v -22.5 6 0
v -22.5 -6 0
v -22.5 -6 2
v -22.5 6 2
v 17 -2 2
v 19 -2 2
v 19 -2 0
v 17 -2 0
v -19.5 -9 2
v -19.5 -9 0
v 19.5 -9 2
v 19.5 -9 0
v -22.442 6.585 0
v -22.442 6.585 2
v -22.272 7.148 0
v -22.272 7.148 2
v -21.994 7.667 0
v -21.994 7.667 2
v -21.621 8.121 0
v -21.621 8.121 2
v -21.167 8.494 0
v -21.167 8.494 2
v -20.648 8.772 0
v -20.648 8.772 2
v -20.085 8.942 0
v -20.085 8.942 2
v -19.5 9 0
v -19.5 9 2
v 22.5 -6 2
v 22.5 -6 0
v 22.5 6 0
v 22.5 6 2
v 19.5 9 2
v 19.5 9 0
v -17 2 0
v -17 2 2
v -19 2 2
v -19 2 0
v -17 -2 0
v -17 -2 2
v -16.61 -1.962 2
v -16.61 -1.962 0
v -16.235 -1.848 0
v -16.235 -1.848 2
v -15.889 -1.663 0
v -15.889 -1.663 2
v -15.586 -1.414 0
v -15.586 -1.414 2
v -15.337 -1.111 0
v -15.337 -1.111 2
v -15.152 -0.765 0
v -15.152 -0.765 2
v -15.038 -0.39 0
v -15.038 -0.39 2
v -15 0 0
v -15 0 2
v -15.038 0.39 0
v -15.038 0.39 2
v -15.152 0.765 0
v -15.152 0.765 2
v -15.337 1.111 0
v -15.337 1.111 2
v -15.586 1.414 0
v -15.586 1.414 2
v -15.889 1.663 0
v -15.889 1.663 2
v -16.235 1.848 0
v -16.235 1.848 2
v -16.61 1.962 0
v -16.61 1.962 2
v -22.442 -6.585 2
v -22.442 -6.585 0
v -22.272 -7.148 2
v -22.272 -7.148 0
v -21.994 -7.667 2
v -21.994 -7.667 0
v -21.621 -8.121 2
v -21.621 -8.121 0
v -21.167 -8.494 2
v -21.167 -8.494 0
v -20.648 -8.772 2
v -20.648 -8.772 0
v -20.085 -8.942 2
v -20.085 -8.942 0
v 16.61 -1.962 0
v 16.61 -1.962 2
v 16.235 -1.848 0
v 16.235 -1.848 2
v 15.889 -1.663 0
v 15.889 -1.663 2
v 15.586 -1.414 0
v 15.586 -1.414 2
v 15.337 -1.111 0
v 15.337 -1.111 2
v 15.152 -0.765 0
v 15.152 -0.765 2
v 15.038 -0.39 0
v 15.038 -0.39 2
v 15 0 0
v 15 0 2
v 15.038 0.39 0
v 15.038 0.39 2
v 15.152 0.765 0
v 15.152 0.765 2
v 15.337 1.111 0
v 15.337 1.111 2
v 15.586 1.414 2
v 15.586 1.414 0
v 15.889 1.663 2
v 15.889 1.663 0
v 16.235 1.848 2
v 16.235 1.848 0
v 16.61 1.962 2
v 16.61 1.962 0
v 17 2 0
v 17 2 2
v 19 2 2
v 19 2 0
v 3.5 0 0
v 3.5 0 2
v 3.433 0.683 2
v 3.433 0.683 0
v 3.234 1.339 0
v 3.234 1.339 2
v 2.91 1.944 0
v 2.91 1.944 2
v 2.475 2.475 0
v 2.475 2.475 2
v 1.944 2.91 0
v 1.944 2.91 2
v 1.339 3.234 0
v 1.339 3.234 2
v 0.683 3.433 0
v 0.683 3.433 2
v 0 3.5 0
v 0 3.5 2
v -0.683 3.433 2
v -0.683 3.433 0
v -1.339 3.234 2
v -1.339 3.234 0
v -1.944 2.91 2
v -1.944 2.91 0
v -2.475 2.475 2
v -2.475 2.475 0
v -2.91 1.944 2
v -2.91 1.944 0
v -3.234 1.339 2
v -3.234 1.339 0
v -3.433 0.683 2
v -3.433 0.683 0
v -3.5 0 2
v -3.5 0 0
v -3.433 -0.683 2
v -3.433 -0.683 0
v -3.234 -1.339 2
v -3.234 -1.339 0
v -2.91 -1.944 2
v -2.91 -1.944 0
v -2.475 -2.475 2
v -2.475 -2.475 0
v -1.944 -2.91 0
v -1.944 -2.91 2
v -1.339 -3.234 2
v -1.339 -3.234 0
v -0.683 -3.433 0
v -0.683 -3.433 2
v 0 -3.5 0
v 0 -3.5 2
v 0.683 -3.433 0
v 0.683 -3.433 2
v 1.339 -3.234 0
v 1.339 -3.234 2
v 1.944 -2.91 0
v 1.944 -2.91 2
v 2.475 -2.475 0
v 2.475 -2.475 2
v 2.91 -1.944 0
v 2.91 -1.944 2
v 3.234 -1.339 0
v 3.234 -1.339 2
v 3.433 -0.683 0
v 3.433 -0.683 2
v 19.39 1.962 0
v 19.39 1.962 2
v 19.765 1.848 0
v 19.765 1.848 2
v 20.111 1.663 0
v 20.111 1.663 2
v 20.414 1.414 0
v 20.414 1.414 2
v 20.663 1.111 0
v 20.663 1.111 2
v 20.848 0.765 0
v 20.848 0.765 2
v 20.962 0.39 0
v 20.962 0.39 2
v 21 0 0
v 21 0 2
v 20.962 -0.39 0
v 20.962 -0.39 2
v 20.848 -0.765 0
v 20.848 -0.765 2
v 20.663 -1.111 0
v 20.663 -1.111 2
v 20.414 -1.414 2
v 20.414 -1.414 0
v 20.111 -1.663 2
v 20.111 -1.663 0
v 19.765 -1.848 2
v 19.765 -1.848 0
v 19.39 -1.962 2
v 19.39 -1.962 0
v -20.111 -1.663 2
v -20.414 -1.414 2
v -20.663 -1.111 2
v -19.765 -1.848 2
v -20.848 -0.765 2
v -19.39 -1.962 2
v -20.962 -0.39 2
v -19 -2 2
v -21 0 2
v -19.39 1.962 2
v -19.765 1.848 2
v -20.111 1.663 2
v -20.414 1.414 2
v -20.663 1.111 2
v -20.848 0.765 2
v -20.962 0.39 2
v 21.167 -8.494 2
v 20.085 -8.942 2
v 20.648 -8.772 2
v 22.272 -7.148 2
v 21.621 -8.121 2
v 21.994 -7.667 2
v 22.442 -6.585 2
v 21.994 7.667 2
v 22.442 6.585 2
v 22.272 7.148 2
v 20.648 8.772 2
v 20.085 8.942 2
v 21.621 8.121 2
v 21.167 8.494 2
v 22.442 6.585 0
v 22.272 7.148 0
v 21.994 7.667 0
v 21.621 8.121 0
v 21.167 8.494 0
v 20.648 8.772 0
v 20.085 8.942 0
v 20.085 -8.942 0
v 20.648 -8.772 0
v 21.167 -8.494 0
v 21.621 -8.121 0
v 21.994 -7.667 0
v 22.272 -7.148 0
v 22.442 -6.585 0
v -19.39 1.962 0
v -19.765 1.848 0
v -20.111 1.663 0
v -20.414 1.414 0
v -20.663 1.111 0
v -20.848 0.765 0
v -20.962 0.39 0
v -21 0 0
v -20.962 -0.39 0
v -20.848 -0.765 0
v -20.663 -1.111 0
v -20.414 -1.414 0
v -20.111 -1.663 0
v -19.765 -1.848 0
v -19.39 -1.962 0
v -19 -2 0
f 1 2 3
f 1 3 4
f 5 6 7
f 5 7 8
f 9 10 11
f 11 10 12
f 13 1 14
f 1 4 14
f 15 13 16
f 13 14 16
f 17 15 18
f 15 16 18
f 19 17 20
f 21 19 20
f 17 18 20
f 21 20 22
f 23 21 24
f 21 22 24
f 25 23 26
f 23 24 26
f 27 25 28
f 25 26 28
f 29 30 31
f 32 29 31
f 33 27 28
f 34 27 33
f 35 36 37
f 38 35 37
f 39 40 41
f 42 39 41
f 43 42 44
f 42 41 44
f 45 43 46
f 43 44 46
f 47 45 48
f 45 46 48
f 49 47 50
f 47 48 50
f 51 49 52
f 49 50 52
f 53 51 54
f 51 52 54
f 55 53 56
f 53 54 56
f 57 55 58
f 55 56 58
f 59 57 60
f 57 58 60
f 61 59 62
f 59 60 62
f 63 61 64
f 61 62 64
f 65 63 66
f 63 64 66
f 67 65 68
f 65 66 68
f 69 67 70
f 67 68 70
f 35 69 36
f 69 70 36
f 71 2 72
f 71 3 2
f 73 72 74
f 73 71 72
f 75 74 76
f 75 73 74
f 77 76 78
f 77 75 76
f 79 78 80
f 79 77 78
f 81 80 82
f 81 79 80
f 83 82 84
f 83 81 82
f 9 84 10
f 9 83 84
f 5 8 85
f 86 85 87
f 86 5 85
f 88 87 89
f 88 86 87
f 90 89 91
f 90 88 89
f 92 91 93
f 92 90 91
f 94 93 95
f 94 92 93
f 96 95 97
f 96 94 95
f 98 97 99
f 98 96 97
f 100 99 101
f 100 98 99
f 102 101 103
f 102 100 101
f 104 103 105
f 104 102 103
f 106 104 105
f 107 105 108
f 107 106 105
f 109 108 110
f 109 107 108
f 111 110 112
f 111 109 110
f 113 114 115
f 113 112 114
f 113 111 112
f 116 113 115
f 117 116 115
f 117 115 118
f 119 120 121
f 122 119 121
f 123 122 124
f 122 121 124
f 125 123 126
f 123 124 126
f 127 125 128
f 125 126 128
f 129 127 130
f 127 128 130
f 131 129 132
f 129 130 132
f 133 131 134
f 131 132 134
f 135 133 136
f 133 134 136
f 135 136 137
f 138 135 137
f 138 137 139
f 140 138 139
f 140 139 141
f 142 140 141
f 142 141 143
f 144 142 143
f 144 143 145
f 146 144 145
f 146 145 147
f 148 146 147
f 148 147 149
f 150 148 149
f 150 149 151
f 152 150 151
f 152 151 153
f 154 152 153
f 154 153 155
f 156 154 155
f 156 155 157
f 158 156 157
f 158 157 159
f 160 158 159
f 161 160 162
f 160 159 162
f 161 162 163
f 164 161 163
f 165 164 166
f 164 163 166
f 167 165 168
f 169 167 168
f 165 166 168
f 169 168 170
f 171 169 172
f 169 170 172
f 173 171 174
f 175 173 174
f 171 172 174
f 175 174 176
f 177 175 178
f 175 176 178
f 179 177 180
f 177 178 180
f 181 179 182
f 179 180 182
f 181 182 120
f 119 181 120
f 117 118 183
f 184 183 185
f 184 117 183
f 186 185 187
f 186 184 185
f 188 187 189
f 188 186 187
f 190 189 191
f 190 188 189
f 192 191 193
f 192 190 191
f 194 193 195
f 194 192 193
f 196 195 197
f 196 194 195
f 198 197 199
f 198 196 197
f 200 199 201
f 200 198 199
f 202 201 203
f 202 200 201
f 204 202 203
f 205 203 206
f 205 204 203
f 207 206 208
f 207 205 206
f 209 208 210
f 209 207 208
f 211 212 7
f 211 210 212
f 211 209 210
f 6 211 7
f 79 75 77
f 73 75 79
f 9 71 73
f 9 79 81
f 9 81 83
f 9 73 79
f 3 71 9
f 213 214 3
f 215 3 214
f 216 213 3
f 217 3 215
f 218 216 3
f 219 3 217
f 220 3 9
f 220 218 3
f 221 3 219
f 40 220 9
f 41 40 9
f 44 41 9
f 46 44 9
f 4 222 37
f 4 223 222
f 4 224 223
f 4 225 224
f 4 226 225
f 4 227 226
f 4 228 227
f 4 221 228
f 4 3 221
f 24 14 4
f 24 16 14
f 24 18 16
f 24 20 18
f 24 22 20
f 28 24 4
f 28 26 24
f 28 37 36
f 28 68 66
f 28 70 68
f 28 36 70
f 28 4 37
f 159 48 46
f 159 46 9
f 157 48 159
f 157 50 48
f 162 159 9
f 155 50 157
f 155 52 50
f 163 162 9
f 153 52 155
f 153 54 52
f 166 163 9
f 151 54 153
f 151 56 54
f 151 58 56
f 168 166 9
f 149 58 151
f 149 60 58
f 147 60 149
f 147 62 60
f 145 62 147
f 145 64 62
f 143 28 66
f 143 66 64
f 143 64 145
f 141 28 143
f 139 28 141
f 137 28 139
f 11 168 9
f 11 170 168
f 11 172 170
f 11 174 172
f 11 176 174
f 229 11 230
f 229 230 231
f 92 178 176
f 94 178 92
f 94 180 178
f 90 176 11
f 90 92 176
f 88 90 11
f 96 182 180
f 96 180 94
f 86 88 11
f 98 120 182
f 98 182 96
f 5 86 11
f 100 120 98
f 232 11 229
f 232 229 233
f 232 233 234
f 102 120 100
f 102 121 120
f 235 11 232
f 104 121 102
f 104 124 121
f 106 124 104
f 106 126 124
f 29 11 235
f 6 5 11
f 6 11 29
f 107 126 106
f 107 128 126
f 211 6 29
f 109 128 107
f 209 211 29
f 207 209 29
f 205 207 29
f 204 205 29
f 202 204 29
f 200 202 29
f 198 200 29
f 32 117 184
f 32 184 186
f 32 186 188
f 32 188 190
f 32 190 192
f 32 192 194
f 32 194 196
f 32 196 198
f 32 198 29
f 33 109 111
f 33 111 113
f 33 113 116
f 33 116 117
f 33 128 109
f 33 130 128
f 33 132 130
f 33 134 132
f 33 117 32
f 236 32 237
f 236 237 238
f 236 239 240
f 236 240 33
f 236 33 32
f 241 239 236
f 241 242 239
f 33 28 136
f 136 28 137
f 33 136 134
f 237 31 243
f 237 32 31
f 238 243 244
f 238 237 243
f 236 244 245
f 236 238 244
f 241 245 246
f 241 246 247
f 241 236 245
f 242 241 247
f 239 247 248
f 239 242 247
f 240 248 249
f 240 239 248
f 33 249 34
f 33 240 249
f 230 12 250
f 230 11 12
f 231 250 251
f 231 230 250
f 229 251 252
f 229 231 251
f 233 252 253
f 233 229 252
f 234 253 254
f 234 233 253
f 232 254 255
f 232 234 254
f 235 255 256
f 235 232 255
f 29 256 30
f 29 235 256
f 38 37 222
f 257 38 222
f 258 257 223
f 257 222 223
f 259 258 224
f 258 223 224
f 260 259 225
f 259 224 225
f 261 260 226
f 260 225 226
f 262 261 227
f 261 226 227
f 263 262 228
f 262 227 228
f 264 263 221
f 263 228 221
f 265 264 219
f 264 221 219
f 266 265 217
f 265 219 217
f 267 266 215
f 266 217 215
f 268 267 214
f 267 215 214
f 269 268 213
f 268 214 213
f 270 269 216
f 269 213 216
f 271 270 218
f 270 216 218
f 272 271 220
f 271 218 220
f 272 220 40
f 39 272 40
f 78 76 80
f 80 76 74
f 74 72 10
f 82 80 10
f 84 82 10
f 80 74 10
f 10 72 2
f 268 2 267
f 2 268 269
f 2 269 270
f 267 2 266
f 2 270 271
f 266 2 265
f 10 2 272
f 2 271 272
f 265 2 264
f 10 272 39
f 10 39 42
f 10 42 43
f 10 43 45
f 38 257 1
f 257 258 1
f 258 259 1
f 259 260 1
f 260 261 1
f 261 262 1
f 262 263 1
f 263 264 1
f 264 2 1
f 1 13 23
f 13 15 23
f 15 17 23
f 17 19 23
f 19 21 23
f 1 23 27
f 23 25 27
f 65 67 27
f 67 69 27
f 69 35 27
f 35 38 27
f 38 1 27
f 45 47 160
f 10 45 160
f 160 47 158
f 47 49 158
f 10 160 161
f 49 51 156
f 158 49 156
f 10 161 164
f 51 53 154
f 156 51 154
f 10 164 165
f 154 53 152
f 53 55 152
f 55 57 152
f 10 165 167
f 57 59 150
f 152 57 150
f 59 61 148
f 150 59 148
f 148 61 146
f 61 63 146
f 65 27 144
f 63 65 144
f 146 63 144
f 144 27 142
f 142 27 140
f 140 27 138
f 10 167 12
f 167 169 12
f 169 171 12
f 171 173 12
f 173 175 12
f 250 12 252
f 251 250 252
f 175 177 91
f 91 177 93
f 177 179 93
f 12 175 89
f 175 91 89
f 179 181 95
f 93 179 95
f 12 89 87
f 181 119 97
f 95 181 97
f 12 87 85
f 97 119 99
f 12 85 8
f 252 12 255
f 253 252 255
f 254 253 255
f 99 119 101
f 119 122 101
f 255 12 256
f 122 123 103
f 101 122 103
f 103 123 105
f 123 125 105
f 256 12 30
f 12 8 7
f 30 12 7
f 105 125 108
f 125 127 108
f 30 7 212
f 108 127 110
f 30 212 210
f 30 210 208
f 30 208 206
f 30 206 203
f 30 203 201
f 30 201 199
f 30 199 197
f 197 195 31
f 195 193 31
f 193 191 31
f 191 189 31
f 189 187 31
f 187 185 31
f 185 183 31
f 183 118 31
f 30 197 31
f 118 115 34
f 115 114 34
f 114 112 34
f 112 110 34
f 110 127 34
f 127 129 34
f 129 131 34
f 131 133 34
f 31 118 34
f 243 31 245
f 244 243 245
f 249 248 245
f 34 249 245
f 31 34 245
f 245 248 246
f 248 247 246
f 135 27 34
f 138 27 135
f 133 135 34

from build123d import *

# Parameters (mm, degrees)
ESQUISSE1_W             = 45
ESQUISSE1_H             = 18
EXTRUSION1_DEPTH        = 2
CONG_1_R                = 3
ENL_V_MAT_EXTRU_1_REACH = 4
ESQUISSE2_R             = 3.5


with BuildPart() as part:
    # Esquisse1 → Extrusion1 (new body)
    with BuildSketch(Plane.XY):
        Rectangle(ESQUISSE1_W, ESQUISSE1_H)
    extrude(amount=EXTRUSION1_DEPTH)

    # Congé1
    cong_1_edges = [part.edges().sort_by_distance(p)[0] for p in [
        (-22.5, 9, 1),
        (22.5, 9, 1),
        (22.5, -9, 1),
        (-22.5, -9, 1),
    ]]
    fillet(cong_1_edges, radius=CONG_1_R)

    # Esquisse2 → Enlèv. mat.-Extru.1 (cut, up to next)
    with BuildSketch(Plane.XY.offset(2), mode=Mode.PRIVATE) as enl_v_mat_extru_1_sk1:
        Circle(ESQUISSE2_R)
    enl_v_mat_extru_1_tool1 = extrude(enl_v_mat_extru_1_sk1.sketch, amount=-ENL_V_MAT_EXTRU_1_REACH, mode=Mode.PRIVATE) & part.part
    add(enl_v_mat_extru_1_tool1.solids().sort_by_distance((0, 0, 2))[0], mode=Mode.SUBTRACT)
    # Esquisse2 → Enlèv. mat.-Extru.1 (cut, up to next)
    with BuildSketch(Plane.XY.offset(2), mode=Mode.PRIVATE) as enl_v_mat_extru_1_sk2:
        with BuildLine():
            Line((17, 2), (19, 2))
            ThreePointArc((19, 2), (21, 0), (19, -2))
            Line((19, -2), (17, -2))
            ThreePointArc((17, -2), (15, 0), (17, 2))
        make_face()
    enl_v_mat_extru_1_tool2 = extrude(enl_v_mat_extru_1_sk2.sketch, amount=-ENL_V_MAT_EXTRU_1_REACH, mode=Mode.PRIVATE) & part.part
    add(enl_v_mat_extru_1_tool2.solids().sort_by_distance((18, 0, 2))[0], mode=Mode.SUBTRACT)
    # Esquisse2 → Enlèv. mat.-Extru.1 (cut, up to next)
    with BuildSketch(Plane.XY.offset(2), mode=Mode.PRIVATE) as enl_v_mat_extru_1_sk3:
        with BuildLine():
            Line((-19, -2), (-17, -2))
            ThreePointArc((-17, -2), (-15, 0), (-17, 2))
            Line((-17, 2), (-19, 2))
            ThreePointArc((-19, 2), (-21, 0), (-19, -2))
        make_face()
    enl_v_mat_extru_1_tool3 = extrude(enl_v_mat_extru_1_sk3.sketch, amount=-ENL_V_MAT_EXTRU_1_REACH, mode=Mode.PRIVATE) & part.part
    add(enl_v_mat_extru_1_tool3.solids().sort_by_distance((-18, 0, 2))[0], mode=Mode.SUBTRACT)


solid = part.part
